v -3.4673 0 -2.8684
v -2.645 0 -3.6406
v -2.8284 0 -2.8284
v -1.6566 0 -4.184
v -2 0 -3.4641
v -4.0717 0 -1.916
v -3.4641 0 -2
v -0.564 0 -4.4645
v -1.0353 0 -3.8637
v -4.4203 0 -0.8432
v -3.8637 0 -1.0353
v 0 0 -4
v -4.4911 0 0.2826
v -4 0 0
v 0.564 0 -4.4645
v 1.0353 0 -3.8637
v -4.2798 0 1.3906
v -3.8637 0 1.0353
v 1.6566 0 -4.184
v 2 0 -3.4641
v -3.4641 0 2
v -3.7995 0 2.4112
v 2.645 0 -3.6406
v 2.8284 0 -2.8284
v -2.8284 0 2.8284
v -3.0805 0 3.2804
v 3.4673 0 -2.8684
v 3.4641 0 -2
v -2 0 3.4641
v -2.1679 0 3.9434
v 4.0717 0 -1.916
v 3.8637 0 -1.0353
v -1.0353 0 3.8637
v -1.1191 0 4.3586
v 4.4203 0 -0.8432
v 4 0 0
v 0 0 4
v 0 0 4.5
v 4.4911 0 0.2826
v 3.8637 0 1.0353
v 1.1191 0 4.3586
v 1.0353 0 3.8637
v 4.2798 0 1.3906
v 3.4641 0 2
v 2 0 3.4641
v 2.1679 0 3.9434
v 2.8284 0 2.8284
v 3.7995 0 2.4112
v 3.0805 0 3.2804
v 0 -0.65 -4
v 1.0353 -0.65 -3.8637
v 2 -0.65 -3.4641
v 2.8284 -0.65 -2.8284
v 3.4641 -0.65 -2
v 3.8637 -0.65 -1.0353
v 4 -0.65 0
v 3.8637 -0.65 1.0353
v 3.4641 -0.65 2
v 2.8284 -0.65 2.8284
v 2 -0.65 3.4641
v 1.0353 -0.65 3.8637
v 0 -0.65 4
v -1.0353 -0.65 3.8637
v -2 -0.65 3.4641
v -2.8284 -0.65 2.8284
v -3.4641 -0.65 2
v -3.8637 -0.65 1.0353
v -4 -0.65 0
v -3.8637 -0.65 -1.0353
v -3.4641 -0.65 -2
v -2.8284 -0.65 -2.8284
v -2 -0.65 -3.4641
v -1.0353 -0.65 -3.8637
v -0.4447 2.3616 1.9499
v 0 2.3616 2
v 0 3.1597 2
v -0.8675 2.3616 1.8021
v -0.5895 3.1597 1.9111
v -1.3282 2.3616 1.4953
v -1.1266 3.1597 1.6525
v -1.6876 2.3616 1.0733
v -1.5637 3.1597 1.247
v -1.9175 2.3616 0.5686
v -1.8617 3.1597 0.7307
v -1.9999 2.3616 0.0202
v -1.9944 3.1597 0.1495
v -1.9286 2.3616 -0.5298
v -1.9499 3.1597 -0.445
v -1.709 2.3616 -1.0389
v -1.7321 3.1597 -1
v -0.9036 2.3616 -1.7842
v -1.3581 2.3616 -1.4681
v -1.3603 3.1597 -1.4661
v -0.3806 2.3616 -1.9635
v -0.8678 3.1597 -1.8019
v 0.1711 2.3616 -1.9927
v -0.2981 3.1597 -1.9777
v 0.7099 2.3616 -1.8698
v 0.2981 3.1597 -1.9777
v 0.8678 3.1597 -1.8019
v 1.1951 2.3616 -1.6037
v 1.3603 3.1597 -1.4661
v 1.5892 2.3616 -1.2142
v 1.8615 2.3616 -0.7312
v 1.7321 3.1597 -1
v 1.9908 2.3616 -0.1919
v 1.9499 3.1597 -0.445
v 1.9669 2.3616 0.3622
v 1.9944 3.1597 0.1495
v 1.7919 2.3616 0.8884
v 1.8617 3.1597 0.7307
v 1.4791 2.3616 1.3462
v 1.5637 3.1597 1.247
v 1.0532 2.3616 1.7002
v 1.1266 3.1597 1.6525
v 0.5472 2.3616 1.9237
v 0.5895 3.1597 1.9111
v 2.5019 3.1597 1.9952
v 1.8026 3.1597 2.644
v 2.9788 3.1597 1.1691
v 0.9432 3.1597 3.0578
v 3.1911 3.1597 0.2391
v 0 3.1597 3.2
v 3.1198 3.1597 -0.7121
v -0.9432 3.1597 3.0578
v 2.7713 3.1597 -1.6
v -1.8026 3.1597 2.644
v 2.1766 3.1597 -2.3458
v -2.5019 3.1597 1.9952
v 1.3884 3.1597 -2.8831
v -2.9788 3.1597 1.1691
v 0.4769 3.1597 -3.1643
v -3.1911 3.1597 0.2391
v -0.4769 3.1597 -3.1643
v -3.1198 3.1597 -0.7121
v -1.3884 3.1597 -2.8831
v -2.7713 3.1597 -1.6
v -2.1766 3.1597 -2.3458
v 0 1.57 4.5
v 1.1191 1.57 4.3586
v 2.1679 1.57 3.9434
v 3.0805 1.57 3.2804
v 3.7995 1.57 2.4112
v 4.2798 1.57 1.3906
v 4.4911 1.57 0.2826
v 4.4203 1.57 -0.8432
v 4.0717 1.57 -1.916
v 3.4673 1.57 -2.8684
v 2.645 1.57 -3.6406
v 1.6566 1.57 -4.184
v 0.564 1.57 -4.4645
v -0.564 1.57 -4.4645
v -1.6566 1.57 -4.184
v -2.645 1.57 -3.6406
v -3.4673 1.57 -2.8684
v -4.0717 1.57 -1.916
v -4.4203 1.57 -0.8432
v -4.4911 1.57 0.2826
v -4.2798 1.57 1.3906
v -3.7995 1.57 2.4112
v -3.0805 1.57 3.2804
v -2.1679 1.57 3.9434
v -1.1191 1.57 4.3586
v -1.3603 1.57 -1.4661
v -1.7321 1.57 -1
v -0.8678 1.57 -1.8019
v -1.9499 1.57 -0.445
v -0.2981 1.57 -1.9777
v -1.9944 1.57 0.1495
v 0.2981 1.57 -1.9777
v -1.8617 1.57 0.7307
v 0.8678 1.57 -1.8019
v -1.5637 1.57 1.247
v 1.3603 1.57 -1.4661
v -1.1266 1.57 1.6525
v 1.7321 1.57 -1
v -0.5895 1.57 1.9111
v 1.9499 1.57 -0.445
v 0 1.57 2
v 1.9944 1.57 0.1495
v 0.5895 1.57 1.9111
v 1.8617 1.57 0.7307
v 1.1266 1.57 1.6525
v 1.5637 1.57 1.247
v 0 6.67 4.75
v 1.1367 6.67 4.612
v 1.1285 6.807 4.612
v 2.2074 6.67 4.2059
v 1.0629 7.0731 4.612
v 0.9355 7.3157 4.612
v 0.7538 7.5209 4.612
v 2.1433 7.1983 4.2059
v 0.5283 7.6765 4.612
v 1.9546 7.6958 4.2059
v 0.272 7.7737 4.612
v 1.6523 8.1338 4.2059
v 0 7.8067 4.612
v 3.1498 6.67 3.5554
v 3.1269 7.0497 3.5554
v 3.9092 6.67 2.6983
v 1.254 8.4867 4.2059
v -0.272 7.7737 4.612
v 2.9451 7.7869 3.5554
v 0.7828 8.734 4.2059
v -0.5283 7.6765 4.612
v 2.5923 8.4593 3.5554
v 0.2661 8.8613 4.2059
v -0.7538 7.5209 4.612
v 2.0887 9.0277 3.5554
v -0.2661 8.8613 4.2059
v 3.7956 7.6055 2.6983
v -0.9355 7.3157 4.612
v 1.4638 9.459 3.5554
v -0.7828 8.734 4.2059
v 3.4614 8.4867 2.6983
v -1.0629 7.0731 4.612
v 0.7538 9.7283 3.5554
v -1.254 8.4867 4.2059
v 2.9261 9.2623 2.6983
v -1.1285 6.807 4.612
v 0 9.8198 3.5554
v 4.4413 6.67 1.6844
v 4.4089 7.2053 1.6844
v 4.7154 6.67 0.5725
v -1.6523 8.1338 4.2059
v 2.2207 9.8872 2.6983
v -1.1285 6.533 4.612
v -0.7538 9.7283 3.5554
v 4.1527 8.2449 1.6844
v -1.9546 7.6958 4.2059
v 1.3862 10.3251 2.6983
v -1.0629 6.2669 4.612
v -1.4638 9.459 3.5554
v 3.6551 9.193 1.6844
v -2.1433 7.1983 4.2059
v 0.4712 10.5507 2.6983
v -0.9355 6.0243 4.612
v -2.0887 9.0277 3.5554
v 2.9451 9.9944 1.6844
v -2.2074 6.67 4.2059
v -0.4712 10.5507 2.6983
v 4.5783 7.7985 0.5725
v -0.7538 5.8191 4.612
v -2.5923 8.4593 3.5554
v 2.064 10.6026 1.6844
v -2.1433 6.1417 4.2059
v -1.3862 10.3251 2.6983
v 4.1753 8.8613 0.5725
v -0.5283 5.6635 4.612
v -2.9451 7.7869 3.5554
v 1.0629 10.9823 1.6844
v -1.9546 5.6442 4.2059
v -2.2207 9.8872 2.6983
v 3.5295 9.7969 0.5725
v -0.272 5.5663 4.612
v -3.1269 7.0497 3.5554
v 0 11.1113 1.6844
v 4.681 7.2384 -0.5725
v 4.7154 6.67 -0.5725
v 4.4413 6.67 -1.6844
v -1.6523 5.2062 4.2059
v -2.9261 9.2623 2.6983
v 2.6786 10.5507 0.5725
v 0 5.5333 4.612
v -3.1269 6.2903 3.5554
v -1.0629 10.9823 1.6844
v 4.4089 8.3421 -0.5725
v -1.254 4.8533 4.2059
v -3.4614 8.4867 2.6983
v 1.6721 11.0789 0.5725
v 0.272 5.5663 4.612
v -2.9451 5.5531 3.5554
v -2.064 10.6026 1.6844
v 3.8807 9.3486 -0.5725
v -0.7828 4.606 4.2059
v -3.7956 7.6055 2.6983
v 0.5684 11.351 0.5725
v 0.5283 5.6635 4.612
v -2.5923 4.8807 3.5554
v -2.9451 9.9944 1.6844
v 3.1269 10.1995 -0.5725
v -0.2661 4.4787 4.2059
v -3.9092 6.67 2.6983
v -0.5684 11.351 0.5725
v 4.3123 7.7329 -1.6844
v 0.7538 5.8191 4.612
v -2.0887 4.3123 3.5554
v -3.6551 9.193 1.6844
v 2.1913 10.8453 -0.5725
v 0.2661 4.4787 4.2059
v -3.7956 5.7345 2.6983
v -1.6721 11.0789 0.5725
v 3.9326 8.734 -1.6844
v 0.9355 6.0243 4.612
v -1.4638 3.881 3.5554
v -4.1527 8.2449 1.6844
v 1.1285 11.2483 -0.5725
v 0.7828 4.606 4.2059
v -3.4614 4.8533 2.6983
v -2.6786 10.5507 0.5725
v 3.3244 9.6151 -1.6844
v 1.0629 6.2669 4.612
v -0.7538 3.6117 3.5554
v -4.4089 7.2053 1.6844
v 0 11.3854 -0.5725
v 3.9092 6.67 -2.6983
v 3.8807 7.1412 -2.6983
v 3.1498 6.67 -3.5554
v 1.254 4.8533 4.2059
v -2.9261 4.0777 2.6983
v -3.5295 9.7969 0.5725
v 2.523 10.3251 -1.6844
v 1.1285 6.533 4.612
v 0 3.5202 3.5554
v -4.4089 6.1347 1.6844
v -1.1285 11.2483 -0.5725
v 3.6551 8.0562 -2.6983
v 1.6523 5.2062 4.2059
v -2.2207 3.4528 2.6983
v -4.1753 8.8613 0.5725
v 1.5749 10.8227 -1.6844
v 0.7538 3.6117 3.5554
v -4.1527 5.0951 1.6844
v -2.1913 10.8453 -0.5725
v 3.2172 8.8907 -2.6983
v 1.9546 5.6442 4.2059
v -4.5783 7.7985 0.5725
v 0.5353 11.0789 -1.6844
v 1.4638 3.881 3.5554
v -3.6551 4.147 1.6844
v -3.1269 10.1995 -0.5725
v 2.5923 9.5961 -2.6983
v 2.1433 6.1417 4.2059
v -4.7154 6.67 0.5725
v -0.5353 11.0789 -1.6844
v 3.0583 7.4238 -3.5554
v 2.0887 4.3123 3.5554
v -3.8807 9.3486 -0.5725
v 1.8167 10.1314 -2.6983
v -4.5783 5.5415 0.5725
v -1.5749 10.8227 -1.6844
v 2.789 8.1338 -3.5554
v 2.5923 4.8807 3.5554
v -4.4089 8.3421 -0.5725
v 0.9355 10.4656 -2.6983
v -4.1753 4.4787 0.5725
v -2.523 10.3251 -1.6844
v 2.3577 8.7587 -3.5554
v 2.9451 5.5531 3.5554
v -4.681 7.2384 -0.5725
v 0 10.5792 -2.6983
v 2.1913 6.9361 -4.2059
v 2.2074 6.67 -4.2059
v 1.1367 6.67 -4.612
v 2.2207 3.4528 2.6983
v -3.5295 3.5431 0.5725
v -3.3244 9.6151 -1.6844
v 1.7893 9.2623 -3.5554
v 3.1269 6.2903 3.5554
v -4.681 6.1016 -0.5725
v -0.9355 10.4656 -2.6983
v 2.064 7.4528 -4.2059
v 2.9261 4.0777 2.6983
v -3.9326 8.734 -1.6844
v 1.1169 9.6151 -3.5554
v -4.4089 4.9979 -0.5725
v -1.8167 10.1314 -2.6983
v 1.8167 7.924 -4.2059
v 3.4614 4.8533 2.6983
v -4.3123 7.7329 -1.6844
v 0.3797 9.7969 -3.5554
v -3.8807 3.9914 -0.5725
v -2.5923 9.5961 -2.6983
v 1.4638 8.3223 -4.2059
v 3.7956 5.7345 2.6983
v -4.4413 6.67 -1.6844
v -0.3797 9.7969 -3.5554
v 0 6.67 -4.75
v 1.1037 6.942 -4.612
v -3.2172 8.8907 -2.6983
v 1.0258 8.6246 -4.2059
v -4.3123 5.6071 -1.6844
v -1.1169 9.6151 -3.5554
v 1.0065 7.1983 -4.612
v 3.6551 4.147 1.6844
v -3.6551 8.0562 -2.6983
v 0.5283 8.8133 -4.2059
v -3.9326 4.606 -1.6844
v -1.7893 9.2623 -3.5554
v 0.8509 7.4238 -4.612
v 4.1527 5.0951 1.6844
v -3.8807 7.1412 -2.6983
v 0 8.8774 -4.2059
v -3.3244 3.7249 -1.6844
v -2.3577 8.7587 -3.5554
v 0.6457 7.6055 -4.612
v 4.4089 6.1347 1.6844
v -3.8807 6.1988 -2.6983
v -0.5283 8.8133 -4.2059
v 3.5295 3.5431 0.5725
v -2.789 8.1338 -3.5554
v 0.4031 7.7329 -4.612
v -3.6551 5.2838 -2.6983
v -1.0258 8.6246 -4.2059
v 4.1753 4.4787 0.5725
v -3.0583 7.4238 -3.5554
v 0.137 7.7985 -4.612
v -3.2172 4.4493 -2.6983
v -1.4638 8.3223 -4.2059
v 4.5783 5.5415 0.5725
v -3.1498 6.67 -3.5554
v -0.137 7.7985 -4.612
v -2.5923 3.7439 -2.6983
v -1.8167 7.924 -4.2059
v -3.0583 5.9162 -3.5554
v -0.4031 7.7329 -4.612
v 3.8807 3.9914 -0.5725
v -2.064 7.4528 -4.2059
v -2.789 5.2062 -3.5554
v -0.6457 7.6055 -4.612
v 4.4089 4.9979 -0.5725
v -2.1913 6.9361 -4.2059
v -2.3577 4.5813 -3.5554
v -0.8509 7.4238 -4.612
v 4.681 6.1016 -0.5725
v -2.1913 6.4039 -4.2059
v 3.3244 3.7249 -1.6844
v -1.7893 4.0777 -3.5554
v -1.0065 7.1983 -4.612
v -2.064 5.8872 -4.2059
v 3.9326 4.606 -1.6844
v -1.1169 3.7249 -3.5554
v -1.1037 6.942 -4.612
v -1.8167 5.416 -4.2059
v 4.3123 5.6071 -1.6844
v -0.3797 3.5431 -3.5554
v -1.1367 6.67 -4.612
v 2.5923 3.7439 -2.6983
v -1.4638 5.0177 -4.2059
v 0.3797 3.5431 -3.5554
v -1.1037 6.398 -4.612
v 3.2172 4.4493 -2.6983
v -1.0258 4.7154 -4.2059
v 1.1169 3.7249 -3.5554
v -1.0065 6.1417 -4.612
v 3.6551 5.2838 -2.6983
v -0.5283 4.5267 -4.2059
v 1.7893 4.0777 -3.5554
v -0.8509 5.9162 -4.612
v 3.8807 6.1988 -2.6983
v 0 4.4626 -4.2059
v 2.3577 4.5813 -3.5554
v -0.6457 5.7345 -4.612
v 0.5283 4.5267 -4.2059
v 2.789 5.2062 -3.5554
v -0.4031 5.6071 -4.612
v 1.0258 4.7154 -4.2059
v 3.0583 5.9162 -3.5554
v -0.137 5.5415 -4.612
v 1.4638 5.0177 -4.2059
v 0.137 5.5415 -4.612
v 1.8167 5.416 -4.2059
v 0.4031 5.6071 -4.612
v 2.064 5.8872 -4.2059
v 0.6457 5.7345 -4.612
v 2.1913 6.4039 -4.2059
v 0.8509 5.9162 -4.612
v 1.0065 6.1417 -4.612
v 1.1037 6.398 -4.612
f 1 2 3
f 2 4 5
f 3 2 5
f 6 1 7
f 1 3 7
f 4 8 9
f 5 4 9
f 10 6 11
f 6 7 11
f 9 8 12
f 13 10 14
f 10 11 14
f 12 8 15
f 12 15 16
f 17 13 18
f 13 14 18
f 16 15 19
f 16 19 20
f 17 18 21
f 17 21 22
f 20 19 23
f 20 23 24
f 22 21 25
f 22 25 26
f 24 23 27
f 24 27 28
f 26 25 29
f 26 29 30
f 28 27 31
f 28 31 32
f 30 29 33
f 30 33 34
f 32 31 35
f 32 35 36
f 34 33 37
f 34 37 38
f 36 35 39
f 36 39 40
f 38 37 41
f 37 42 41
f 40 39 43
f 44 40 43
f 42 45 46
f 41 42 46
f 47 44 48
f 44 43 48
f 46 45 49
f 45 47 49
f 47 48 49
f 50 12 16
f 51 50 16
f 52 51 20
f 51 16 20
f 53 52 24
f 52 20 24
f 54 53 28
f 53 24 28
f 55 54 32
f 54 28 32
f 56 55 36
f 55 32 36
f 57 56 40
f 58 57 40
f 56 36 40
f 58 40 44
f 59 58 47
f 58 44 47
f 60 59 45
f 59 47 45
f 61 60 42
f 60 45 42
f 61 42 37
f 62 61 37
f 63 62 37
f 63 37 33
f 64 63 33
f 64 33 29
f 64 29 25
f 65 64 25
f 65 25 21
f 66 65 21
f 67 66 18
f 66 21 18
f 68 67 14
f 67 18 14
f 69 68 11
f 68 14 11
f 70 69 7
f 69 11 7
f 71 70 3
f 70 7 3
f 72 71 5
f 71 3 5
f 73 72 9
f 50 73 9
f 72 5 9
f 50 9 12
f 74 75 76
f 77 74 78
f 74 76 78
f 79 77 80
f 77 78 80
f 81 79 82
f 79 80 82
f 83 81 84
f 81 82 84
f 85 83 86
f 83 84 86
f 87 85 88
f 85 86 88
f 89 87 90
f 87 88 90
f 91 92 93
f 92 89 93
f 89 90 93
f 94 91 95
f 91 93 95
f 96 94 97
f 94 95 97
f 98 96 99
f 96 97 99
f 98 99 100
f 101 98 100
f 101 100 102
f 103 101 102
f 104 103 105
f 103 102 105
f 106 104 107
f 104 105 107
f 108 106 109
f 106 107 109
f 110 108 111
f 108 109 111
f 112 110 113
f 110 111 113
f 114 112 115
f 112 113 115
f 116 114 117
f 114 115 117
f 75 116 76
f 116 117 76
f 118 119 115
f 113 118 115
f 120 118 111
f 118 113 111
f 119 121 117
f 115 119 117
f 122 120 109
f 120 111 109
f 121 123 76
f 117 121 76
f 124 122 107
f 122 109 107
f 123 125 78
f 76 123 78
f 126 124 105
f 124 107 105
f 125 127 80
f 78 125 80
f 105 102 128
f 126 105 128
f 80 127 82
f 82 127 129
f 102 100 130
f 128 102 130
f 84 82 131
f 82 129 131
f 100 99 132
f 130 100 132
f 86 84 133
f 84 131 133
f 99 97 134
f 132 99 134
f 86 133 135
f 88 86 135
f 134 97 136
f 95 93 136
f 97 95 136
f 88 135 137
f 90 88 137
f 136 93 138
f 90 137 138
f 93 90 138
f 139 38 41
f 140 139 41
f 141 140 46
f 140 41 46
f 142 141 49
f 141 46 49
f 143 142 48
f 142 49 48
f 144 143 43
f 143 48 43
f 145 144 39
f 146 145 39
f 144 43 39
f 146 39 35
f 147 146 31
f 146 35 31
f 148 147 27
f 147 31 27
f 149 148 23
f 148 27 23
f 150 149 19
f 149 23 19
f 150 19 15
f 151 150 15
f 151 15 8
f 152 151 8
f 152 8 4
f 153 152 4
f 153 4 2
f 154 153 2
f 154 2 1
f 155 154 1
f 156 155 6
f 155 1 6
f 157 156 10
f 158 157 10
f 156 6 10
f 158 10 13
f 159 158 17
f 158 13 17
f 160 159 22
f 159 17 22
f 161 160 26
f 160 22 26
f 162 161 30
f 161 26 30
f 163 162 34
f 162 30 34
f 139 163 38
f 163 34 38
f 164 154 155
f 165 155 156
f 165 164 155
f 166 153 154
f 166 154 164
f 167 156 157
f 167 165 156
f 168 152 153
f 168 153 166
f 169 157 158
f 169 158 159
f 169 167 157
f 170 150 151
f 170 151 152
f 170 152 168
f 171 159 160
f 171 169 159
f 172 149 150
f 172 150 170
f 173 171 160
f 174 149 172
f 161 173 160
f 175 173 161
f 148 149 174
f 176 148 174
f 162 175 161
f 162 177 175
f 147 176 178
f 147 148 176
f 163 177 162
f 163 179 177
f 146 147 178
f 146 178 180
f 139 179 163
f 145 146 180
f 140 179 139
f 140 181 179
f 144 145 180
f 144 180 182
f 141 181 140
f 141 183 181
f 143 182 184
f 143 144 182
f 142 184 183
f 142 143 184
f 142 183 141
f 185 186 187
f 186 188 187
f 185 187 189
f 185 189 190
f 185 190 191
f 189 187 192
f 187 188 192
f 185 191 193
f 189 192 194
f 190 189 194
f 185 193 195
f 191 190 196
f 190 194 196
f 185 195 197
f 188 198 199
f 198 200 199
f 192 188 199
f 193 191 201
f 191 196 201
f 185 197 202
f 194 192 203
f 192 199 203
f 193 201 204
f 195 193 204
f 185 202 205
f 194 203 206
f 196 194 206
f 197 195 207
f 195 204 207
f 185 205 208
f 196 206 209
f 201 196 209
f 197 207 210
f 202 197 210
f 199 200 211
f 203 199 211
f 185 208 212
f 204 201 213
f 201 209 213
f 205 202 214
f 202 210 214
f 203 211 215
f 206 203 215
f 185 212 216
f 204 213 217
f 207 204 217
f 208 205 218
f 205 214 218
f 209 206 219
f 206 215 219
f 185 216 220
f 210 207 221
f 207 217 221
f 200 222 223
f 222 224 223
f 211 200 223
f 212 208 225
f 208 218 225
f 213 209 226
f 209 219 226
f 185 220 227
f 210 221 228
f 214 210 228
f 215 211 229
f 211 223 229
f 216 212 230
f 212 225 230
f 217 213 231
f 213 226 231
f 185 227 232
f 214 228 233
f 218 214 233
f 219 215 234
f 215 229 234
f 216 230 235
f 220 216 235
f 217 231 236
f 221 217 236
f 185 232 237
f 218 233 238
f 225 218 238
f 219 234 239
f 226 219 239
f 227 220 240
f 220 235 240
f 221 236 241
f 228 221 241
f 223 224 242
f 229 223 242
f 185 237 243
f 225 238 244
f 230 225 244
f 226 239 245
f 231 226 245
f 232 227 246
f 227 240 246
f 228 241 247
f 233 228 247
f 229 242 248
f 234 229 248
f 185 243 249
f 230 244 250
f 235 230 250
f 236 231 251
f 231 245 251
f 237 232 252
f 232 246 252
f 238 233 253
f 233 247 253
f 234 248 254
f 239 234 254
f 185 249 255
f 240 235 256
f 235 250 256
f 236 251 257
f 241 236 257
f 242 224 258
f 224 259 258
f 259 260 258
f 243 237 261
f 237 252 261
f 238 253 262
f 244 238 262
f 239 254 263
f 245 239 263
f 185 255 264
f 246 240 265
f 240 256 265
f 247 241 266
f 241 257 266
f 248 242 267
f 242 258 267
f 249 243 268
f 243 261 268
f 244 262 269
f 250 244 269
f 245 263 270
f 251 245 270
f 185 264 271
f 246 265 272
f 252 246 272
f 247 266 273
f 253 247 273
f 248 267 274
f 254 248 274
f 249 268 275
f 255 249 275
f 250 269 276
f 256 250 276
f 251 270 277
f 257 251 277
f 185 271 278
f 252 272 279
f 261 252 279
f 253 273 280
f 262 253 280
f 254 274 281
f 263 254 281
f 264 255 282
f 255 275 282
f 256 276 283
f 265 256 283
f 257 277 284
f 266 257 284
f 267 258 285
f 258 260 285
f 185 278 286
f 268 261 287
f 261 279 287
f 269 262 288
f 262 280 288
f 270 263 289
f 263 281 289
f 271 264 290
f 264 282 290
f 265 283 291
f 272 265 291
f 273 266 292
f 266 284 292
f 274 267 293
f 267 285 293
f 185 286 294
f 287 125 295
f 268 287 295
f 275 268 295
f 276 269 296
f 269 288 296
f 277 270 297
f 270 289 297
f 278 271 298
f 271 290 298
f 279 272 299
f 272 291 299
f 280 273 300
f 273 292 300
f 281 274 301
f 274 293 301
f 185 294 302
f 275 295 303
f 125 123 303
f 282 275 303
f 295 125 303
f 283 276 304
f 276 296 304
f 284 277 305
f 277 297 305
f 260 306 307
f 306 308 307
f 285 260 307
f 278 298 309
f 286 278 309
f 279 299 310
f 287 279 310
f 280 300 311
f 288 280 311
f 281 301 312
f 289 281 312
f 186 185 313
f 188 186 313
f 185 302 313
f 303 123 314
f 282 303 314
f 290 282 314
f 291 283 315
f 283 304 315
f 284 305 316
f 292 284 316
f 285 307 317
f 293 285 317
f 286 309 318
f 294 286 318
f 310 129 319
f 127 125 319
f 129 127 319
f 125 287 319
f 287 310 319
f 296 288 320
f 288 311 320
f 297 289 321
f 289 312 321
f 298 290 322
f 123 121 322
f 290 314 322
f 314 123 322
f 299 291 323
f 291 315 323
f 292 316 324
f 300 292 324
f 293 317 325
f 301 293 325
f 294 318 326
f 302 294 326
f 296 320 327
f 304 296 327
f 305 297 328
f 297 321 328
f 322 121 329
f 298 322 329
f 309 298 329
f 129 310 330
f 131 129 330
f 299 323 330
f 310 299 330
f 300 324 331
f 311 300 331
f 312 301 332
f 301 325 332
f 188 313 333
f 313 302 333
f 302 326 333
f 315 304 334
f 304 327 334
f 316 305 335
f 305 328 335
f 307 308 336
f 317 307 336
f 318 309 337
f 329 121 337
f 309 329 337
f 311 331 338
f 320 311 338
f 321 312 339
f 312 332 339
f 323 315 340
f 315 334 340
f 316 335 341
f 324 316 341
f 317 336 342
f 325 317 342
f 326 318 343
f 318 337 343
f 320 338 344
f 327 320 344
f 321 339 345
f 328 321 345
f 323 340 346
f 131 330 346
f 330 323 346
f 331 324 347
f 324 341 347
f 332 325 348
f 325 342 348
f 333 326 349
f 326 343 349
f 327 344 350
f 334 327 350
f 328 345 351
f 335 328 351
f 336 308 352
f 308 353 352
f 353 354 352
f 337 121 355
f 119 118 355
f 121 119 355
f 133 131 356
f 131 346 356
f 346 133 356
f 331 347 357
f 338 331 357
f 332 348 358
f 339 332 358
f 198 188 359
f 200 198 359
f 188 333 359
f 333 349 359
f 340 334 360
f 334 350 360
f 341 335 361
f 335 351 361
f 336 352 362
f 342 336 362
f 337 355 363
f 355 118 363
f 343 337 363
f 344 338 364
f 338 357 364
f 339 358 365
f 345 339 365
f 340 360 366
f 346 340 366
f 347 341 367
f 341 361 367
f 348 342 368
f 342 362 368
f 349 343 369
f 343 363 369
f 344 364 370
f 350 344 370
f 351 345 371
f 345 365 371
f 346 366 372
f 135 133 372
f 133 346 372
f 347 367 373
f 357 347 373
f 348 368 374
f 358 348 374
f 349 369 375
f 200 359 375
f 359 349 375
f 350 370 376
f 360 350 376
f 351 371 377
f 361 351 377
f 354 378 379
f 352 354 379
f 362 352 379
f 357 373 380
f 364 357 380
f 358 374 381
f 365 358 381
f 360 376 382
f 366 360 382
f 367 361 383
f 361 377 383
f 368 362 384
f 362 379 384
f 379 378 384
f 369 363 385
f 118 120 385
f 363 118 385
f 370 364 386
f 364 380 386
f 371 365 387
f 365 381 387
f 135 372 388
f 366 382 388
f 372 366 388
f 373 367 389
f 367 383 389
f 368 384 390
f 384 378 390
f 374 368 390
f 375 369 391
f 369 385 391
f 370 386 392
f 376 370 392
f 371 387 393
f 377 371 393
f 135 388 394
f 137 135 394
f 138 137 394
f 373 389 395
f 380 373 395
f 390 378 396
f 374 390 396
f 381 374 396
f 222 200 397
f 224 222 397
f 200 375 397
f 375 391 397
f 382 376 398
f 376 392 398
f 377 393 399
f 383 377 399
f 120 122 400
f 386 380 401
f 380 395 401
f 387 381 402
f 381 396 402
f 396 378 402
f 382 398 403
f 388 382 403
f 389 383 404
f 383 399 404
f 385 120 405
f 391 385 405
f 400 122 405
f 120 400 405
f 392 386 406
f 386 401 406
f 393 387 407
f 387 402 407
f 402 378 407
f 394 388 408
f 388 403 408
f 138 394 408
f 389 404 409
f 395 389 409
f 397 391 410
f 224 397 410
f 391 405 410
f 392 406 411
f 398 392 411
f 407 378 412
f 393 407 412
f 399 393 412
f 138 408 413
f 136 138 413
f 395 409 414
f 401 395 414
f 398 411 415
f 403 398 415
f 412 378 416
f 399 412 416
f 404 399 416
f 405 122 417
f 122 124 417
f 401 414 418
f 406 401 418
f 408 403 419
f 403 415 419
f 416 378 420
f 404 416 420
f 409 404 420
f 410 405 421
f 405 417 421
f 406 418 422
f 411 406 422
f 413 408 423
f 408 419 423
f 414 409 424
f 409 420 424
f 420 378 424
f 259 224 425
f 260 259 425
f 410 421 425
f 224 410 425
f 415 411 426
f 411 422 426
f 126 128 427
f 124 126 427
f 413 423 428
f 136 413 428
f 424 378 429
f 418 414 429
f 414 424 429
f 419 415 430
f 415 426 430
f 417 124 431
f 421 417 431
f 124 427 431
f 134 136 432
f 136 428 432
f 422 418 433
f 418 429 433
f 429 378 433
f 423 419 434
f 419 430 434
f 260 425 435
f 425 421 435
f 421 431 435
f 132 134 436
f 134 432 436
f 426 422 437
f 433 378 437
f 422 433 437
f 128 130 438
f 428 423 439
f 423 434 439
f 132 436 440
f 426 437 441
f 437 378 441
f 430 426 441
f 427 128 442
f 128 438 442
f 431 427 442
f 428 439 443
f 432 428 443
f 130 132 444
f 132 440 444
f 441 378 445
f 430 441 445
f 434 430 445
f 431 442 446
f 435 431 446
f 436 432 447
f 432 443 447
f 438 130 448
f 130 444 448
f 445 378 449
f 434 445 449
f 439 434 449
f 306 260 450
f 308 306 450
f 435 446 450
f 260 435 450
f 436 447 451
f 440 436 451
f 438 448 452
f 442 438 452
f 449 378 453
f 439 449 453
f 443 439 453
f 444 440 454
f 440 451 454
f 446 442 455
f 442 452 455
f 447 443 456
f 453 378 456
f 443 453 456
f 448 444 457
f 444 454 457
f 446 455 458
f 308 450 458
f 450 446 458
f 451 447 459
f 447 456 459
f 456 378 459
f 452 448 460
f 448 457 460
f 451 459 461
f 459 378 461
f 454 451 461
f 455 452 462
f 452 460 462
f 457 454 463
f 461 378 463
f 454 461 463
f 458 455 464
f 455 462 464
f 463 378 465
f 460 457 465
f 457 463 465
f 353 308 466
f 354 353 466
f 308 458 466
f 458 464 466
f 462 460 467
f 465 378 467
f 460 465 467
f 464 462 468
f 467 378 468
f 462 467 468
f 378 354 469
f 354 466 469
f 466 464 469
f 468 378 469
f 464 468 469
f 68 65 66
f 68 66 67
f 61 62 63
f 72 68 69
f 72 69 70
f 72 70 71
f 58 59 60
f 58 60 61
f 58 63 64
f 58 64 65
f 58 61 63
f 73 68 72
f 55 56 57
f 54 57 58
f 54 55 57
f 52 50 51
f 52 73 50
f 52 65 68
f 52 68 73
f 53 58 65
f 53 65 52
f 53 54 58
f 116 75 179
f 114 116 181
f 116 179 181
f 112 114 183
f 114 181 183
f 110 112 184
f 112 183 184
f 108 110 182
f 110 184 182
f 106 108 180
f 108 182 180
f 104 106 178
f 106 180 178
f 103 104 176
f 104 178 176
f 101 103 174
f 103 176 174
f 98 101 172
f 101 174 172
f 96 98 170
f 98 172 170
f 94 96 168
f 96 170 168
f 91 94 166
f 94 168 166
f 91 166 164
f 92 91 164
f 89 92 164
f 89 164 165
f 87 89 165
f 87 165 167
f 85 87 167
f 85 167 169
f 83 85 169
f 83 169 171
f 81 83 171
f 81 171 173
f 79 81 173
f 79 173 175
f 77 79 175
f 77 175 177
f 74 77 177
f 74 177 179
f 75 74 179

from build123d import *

# Parameters (mm, degrees)
SKETCH1_R           = 4.5
BOSS_EXTRUDE1_DEPTH = 1.57
SKETCH2_R           = 2
BOSS_EXTRUDE2_DEPTH = 5.1
SKETCH5_W           = 1.2
SKETCH5_H           = 0.798080121
SKETCH4_R           = 4
BOSS_EXTRUDE3_DEPTH = 0.65


with BuildPart() as part:
    # Sketch1 → Boss-Extrude1 (new body)
    with BuildSketch(Plane(origin=(0, 0, 0), x_dir=(1, 0, 0), z_dir=(0, 1, 0))):
        with Locations(Location((0, 0, 0), (0, 0, 270))):
            Circle(SKETCH1_R)
    extrude(amount=BOSS_EXTRUDE1_DEPTH)

    # Sketch2 → Boss-Extrude2 (add)
    with BuildSketch(Plane(origin=(0, 1.57, 0), x_dir=(1, 0, 0), z_dir=(0, 1, 0))):
        with Locations(Location((0, 0, 0), (0, 0, 270))):
            Circle(SKETCH2_R)
    extrude(amount=BOSS_EXTRUDE2_DEPTH)

    # Sketch3 → Revolve1 (revolve)
    with BuildSketch(Plane(origin=(0, 6.67, 0), x_dir=(1, 0, 0), z_dir=(0, 1, 0))):
        with BuildLine():
            Line((0, 4.75), (0, -4.75))
            ThreePointArc((0, -4.75), (4.75, 0), (0, 4.75))
        make_face()
    revolve(axis=Axis((0, 6.67, -8.311953328), (0, 0, 1)))

    # Sketch5 → Cut-Revolve1 (revolve, cut)
    with BuildSketch(Plane.XY, mode=Mode.PRIVATE) as cut_revolve1_sk:
        with Locations((2.6, 2.760618076)):
            Rectangle(SKETCH5_W, SKETCH5_H)
    revolve(cut_revolve1_sk.sketch.rotate(Axis((0, 3.159658136, 0), (0, -1, 0)), 90), axis=Axis((0, 3.159658136, 0), (0, -1, 0)), mode=Mode.SUBTRACT)

    # Sketch4 → Boss-Extrude3 (add)
    with BuildSketch(Plane.XZ):
        with Locations(Location((0, 0, 0), (0, 0, 270))):
            Circle(SKETCH4_R)
    extrude(amount=BOSS_EXTRUDE3_DEPTH)


solid = part.part
